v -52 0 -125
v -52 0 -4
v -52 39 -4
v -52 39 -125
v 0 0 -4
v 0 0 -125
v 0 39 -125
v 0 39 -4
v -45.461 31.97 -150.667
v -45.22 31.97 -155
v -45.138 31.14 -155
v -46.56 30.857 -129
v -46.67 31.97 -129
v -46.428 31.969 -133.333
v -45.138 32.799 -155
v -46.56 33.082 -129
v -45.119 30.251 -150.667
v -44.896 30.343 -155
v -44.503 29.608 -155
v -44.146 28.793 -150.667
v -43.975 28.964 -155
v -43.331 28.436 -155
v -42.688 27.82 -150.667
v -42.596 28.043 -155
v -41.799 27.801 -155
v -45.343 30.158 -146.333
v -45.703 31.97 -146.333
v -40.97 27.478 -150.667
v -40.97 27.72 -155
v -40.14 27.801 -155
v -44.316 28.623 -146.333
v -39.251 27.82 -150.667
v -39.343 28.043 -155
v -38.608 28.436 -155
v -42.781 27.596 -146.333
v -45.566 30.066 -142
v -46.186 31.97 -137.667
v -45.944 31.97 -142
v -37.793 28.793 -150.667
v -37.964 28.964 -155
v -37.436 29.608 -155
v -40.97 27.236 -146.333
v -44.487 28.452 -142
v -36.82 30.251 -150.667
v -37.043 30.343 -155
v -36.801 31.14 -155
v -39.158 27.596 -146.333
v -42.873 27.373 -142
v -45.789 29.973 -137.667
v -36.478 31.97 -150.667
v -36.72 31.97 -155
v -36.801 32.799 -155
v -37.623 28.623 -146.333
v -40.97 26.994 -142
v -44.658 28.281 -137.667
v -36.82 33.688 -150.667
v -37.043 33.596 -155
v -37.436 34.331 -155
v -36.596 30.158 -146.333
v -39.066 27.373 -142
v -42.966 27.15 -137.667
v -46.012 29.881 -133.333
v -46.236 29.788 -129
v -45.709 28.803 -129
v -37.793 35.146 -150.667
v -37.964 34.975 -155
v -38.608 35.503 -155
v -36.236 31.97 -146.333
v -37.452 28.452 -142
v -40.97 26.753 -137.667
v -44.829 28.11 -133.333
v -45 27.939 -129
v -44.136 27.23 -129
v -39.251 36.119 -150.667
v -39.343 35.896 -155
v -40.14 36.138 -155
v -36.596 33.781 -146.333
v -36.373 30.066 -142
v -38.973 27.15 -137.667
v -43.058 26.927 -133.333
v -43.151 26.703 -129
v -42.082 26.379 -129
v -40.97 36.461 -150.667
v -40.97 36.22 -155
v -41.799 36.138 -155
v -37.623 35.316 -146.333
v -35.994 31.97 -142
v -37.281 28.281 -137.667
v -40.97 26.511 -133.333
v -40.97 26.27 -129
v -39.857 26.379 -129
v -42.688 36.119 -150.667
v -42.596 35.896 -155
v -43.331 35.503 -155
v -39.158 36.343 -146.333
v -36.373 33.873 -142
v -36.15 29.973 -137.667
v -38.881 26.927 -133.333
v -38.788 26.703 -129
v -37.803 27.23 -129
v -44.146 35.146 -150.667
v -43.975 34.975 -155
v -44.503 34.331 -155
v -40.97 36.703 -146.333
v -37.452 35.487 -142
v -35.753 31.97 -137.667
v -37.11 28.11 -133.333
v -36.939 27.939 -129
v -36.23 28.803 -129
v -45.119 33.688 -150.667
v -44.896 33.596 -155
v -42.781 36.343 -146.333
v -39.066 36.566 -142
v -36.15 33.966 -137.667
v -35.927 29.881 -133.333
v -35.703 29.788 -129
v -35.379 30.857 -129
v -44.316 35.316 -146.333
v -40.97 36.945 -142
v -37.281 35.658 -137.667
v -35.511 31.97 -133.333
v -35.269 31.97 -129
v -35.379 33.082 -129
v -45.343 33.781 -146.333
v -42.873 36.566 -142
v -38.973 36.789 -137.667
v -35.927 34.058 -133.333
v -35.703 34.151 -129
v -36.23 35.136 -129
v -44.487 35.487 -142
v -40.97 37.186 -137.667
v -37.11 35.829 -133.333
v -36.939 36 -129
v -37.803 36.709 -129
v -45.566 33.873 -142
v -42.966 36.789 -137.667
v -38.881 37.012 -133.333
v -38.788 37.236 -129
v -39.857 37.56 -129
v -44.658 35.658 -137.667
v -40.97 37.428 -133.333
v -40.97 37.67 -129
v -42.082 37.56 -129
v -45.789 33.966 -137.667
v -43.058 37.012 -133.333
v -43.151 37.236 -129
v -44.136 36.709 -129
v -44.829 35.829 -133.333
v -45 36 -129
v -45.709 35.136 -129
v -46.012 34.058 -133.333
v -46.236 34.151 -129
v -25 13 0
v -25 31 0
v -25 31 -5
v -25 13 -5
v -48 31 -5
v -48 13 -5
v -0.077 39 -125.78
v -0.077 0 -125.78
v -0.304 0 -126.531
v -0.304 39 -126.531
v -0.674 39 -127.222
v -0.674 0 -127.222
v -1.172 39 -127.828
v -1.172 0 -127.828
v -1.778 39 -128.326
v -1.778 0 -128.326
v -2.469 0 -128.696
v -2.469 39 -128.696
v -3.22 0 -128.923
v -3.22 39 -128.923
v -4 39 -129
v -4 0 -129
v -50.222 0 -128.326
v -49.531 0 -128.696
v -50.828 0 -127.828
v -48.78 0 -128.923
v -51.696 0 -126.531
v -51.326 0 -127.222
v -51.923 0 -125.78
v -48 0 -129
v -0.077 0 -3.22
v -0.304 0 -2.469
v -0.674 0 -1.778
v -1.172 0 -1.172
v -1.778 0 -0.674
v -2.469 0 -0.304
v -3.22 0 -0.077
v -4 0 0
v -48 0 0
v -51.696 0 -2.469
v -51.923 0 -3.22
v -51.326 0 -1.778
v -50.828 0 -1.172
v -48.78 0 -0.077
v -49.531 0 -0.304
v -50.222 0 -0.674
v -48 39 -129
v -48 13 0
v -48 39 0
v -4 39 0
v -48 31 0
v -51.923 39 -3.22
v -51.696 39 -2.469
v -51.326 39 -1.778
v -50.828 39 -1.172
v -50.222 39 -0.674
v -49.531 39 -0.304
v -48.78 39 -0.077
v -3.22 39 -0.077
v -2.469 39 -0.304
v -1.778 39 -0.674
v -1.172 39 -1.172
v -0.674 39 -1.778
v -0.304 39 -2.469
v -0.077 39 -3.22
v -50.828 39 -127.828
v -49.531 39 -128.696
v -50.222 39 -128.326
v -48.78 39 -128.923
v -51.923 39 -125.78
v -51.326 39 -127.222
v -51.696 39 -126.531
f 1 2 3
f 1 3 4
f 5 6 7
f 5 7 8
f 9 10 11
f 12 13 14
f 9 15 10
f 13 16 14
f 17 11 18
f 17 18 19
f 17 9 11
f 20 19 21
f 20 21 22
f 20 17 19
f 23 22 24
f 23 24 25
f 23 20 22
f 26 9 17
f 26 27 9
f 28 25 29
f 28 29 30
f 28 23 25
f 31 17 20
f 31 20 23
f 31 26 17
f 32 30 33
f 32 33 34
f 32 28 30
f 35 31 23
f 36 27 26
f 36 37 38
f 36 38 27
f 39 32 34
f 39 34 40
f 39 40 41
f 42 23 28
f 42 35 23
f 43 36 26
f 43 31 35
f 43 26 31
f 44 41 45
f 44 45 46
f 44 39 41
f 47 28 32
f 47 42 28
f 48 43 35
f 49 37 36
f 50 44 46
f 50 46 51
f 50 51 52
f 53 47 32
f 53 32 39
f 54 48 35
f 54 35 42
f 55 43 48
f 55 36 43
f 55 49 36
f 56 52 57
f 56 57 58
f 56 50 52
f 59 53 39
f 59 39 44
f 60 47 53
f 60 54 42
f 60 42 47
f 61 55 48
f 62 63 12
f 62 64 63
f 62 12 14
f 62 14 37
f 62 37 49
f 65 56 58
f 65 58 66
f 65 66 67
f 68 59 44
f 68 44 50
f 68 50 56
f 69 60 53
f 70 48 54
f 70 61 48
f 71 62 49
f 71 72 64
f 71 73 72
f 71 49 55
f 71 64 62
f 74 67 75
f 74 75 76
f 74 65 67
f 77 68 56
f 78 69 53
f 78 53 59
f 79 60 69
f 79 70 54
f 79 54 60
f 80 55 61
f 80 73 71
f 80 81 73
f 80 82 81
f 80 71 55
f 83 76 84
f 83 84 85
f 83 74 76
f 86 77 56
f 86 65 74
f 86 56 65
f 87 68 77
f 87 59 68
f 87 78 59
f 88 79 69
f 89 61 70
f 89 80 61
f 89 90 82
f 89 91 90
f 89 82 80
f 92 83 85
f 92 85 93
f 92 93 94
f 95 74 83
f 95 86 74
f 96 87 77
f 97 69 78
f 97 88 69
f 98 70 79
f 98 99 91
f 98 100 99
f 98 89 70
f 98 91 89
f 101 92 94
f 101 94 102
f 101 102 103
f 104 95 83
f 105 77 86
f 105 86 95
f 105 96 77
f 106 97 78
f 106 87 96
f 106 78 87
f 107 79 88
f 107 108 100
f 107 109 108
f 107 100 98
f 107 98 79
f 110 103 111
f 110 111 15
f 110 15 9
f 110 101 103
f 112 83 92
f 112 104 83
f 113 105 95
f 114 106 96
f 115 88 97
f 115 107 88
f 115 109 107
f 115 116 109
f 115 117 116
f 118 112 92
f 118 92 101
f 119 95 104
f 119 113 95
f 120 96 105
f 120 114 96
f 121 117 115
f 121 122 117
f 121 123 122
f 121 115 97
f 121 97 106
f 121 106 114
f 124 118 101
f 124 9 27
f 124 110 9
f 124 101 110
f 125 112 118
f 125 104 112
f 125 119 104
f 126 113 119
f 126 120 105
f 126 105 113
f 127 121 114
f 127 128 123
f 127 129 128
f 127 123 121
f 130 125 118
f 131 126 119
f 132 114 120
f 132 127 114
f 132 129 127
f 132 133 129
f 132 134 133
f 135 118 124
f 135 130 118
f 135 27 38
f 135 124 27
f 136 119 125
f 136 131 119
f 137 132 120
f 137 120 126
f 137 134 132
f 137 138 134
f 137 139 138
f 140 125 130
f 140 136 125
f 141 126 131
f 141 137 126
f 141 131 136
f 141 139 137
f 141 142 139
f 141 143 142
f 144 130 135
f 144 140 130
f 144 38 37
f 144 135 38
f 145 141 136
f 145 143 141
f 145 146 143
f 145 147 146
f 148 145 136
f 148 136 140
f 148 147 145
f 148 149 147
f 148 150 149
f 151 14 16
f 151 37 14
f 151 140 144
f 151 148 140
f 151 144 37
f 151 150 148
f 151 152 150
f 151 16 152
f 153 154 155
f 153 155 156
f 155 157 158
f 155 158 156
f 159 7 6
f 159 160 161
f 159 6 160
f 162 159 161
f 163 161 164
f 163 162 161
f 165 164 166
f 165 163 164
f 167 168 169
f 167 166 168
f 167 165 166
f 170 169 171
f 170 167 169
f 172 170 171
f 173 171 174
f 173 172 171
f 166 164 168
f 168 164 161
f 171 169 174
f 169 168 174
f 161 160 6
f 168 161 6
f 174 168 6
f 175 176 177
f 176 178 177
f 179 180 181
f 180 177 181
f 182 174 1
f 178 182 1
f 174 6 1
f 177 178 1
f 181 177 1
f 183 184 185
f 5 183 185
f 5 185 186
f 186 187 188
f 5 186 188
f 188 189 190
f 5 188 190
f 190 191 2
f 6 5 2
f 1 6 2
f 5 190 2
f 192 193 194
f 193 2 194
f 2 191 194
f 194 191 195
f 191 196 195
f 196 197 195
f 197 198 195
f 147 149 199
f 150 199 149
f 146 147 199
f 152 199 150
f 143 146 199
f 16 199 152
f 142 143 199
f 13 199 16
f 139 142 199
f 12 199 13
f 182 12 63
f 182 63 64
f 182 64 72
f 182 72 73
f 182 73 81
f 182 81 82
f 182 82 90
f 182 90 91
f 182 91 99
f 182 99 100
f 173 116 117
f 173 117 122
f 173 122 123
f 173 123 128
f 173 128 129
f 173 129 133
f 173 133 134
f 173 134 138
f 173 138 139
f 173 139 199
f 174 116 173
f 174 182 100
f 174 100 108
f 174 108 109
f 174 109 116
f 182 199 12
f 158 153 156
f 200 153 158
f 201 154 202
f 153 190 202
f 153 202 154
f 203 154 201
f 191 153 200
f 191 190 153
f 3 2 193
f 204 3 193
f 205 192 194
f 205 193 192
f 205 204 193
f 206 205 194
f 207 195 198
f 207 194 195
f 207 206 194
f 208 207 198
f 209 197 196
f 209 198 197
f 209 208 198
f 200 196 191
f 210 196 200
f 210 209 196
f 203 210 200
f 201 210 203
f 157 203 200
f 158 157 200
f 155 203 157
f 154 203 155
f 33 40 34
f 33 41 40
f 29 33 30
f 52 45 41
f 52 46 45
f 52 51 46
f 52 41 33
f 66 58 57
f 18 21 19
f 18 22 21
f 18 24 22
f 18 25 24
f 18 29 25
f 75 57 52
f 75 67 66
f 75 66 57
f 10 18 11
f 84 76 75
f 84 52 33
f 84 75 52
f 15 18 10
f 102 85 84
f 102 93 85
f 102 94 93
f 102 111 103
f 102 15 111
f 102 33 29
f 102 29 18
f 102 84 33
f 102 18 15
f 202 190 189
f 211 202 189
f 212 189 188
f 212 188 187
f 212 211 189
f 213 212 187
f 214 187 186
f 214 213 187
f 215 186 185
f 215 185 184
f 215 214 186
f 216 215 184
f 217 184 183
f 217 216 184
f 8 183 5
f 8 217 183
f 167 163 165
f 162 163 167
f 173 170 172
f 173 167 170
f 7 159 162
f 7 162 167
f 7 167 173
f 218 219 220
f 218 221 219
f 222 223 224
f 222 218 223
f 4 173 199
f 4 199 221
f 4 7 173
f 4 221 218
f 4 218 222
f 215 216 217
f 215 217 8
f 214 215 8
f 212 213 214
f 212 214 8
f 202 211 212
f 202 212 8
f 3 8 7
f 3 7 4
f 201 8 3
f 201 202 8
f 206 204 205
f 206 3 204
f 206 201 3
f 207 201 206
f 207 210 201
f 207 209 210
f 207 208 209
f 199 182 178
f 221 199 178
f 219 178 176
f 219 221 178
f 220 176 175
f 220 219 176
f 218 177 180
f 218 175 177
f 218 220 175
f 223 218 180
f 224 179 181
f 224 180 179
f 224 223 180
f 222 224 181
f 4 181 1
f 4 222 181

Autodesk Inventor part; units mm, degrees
ref_plane "YZ Plane" through (0, 0, 0) normal (1, 0, 0) x (0, 1, 0)
ref_plane "XZ Plane" through (0, 0, 0) normal (0, 1, 0) x (-1, 0, 0)
sketch "Sketch1" plane through (0, 0, 0) normal (0, 1, 0) x (-1, 0, 0)
  line L0 (0, 0) -> (52, 0)
  line L1 (52, 0) -> (52, -129)
  line L2 (52, -129) -> (0, -129)
  line L3 (0, -129) -> (0, 0)
  dimension "d0" = 52
  dimension "d1" = 129
extrude "Extrusion1" add sketch "Sketch1" along normal blind 39
fillet "Fillet1" radius 4 4 edges at (0, 19.5, 0) (0, 19.5, -129) (-52, 19.5, 0) (-52, 19.5, -129)
sketch "Sketch2" plane through (-48, 0, 0) normal (0, 0, 1) x (1, 0, 0)
  line L0 (44, 39) -> (0, 39) projected
  line L1 (0, 39) -> (0, 31)
  line L2 (0, 39) -> (0, 0) projected
  line L3 (0, 31) -> (23, 31)
  line L4 (23, 31) -> (23, 13)
  line L5 (23, 13) -> (0, 13)
  line L6 (0, 13) -> (0, 31)
  point P0 (48, 0)
  dimension "d5" = 8
  dimension "d6" = 23
  dimension "d7" = 18
extrude "Extrusion2" cut sketch "Sketch2" against normal blind 5
sketch "Sketch3" plane through (-4, 0, -129) normal (0, 0, -1) x (-1, 0, 0)
  line L0 (0, 39) -> (44, 39) projected
  line L1 (44, 39) -> (44, 36)
  line L2 (44, 39) -> (44, 0) projected
  line L3 (44, 36) -> (41, 36)
  line L4 (41, 36) -> (36.9695, 31.9695)
  line L5 (41, 36) -> (46.7, 36) construction
  circle A0 centre (36.9695, 31.9695) radius 5.7
  point P0 (-4, 0)
  dimension "d10" = 3
  dimension "d11" = 3
  dimension "d12" = 5.7
  dimension "d13" = 135
ref_plane "Work Plane1" through (-4, 0, -155) normal (0, 0, -1) x (-1, 0, 0)
sketch "Sketch4" plane through (-4, 0, -155) normal (0, 0, -1) x (-1, 0, 0)
  line L0 (0, 39) -> (44, 39) projected
  line L1 (44, 39) -> (44, 36)
  line L2 (44, 39) -> (44, 0) projected
  line L3 (44, 36) -> (41, 36)
  line L4 (41, 36) -> (36.9695, 31.9695)
  line L5 (41, 36) -> (46.7, 36) construction
  circle A0 centre (36.9695, 31.9695) radius 4.25
  point P0 (-4, 0)
  dimension "d15" = 3
  dimension "d16" = 3
  dimension "d17" = 5.7
  dimension "d18" = 135
  dimension "d19" = 8.5
loft "Loft1" add profiles "Sketch3", "Sketch4"
properties part number "NucPowerBrick"
